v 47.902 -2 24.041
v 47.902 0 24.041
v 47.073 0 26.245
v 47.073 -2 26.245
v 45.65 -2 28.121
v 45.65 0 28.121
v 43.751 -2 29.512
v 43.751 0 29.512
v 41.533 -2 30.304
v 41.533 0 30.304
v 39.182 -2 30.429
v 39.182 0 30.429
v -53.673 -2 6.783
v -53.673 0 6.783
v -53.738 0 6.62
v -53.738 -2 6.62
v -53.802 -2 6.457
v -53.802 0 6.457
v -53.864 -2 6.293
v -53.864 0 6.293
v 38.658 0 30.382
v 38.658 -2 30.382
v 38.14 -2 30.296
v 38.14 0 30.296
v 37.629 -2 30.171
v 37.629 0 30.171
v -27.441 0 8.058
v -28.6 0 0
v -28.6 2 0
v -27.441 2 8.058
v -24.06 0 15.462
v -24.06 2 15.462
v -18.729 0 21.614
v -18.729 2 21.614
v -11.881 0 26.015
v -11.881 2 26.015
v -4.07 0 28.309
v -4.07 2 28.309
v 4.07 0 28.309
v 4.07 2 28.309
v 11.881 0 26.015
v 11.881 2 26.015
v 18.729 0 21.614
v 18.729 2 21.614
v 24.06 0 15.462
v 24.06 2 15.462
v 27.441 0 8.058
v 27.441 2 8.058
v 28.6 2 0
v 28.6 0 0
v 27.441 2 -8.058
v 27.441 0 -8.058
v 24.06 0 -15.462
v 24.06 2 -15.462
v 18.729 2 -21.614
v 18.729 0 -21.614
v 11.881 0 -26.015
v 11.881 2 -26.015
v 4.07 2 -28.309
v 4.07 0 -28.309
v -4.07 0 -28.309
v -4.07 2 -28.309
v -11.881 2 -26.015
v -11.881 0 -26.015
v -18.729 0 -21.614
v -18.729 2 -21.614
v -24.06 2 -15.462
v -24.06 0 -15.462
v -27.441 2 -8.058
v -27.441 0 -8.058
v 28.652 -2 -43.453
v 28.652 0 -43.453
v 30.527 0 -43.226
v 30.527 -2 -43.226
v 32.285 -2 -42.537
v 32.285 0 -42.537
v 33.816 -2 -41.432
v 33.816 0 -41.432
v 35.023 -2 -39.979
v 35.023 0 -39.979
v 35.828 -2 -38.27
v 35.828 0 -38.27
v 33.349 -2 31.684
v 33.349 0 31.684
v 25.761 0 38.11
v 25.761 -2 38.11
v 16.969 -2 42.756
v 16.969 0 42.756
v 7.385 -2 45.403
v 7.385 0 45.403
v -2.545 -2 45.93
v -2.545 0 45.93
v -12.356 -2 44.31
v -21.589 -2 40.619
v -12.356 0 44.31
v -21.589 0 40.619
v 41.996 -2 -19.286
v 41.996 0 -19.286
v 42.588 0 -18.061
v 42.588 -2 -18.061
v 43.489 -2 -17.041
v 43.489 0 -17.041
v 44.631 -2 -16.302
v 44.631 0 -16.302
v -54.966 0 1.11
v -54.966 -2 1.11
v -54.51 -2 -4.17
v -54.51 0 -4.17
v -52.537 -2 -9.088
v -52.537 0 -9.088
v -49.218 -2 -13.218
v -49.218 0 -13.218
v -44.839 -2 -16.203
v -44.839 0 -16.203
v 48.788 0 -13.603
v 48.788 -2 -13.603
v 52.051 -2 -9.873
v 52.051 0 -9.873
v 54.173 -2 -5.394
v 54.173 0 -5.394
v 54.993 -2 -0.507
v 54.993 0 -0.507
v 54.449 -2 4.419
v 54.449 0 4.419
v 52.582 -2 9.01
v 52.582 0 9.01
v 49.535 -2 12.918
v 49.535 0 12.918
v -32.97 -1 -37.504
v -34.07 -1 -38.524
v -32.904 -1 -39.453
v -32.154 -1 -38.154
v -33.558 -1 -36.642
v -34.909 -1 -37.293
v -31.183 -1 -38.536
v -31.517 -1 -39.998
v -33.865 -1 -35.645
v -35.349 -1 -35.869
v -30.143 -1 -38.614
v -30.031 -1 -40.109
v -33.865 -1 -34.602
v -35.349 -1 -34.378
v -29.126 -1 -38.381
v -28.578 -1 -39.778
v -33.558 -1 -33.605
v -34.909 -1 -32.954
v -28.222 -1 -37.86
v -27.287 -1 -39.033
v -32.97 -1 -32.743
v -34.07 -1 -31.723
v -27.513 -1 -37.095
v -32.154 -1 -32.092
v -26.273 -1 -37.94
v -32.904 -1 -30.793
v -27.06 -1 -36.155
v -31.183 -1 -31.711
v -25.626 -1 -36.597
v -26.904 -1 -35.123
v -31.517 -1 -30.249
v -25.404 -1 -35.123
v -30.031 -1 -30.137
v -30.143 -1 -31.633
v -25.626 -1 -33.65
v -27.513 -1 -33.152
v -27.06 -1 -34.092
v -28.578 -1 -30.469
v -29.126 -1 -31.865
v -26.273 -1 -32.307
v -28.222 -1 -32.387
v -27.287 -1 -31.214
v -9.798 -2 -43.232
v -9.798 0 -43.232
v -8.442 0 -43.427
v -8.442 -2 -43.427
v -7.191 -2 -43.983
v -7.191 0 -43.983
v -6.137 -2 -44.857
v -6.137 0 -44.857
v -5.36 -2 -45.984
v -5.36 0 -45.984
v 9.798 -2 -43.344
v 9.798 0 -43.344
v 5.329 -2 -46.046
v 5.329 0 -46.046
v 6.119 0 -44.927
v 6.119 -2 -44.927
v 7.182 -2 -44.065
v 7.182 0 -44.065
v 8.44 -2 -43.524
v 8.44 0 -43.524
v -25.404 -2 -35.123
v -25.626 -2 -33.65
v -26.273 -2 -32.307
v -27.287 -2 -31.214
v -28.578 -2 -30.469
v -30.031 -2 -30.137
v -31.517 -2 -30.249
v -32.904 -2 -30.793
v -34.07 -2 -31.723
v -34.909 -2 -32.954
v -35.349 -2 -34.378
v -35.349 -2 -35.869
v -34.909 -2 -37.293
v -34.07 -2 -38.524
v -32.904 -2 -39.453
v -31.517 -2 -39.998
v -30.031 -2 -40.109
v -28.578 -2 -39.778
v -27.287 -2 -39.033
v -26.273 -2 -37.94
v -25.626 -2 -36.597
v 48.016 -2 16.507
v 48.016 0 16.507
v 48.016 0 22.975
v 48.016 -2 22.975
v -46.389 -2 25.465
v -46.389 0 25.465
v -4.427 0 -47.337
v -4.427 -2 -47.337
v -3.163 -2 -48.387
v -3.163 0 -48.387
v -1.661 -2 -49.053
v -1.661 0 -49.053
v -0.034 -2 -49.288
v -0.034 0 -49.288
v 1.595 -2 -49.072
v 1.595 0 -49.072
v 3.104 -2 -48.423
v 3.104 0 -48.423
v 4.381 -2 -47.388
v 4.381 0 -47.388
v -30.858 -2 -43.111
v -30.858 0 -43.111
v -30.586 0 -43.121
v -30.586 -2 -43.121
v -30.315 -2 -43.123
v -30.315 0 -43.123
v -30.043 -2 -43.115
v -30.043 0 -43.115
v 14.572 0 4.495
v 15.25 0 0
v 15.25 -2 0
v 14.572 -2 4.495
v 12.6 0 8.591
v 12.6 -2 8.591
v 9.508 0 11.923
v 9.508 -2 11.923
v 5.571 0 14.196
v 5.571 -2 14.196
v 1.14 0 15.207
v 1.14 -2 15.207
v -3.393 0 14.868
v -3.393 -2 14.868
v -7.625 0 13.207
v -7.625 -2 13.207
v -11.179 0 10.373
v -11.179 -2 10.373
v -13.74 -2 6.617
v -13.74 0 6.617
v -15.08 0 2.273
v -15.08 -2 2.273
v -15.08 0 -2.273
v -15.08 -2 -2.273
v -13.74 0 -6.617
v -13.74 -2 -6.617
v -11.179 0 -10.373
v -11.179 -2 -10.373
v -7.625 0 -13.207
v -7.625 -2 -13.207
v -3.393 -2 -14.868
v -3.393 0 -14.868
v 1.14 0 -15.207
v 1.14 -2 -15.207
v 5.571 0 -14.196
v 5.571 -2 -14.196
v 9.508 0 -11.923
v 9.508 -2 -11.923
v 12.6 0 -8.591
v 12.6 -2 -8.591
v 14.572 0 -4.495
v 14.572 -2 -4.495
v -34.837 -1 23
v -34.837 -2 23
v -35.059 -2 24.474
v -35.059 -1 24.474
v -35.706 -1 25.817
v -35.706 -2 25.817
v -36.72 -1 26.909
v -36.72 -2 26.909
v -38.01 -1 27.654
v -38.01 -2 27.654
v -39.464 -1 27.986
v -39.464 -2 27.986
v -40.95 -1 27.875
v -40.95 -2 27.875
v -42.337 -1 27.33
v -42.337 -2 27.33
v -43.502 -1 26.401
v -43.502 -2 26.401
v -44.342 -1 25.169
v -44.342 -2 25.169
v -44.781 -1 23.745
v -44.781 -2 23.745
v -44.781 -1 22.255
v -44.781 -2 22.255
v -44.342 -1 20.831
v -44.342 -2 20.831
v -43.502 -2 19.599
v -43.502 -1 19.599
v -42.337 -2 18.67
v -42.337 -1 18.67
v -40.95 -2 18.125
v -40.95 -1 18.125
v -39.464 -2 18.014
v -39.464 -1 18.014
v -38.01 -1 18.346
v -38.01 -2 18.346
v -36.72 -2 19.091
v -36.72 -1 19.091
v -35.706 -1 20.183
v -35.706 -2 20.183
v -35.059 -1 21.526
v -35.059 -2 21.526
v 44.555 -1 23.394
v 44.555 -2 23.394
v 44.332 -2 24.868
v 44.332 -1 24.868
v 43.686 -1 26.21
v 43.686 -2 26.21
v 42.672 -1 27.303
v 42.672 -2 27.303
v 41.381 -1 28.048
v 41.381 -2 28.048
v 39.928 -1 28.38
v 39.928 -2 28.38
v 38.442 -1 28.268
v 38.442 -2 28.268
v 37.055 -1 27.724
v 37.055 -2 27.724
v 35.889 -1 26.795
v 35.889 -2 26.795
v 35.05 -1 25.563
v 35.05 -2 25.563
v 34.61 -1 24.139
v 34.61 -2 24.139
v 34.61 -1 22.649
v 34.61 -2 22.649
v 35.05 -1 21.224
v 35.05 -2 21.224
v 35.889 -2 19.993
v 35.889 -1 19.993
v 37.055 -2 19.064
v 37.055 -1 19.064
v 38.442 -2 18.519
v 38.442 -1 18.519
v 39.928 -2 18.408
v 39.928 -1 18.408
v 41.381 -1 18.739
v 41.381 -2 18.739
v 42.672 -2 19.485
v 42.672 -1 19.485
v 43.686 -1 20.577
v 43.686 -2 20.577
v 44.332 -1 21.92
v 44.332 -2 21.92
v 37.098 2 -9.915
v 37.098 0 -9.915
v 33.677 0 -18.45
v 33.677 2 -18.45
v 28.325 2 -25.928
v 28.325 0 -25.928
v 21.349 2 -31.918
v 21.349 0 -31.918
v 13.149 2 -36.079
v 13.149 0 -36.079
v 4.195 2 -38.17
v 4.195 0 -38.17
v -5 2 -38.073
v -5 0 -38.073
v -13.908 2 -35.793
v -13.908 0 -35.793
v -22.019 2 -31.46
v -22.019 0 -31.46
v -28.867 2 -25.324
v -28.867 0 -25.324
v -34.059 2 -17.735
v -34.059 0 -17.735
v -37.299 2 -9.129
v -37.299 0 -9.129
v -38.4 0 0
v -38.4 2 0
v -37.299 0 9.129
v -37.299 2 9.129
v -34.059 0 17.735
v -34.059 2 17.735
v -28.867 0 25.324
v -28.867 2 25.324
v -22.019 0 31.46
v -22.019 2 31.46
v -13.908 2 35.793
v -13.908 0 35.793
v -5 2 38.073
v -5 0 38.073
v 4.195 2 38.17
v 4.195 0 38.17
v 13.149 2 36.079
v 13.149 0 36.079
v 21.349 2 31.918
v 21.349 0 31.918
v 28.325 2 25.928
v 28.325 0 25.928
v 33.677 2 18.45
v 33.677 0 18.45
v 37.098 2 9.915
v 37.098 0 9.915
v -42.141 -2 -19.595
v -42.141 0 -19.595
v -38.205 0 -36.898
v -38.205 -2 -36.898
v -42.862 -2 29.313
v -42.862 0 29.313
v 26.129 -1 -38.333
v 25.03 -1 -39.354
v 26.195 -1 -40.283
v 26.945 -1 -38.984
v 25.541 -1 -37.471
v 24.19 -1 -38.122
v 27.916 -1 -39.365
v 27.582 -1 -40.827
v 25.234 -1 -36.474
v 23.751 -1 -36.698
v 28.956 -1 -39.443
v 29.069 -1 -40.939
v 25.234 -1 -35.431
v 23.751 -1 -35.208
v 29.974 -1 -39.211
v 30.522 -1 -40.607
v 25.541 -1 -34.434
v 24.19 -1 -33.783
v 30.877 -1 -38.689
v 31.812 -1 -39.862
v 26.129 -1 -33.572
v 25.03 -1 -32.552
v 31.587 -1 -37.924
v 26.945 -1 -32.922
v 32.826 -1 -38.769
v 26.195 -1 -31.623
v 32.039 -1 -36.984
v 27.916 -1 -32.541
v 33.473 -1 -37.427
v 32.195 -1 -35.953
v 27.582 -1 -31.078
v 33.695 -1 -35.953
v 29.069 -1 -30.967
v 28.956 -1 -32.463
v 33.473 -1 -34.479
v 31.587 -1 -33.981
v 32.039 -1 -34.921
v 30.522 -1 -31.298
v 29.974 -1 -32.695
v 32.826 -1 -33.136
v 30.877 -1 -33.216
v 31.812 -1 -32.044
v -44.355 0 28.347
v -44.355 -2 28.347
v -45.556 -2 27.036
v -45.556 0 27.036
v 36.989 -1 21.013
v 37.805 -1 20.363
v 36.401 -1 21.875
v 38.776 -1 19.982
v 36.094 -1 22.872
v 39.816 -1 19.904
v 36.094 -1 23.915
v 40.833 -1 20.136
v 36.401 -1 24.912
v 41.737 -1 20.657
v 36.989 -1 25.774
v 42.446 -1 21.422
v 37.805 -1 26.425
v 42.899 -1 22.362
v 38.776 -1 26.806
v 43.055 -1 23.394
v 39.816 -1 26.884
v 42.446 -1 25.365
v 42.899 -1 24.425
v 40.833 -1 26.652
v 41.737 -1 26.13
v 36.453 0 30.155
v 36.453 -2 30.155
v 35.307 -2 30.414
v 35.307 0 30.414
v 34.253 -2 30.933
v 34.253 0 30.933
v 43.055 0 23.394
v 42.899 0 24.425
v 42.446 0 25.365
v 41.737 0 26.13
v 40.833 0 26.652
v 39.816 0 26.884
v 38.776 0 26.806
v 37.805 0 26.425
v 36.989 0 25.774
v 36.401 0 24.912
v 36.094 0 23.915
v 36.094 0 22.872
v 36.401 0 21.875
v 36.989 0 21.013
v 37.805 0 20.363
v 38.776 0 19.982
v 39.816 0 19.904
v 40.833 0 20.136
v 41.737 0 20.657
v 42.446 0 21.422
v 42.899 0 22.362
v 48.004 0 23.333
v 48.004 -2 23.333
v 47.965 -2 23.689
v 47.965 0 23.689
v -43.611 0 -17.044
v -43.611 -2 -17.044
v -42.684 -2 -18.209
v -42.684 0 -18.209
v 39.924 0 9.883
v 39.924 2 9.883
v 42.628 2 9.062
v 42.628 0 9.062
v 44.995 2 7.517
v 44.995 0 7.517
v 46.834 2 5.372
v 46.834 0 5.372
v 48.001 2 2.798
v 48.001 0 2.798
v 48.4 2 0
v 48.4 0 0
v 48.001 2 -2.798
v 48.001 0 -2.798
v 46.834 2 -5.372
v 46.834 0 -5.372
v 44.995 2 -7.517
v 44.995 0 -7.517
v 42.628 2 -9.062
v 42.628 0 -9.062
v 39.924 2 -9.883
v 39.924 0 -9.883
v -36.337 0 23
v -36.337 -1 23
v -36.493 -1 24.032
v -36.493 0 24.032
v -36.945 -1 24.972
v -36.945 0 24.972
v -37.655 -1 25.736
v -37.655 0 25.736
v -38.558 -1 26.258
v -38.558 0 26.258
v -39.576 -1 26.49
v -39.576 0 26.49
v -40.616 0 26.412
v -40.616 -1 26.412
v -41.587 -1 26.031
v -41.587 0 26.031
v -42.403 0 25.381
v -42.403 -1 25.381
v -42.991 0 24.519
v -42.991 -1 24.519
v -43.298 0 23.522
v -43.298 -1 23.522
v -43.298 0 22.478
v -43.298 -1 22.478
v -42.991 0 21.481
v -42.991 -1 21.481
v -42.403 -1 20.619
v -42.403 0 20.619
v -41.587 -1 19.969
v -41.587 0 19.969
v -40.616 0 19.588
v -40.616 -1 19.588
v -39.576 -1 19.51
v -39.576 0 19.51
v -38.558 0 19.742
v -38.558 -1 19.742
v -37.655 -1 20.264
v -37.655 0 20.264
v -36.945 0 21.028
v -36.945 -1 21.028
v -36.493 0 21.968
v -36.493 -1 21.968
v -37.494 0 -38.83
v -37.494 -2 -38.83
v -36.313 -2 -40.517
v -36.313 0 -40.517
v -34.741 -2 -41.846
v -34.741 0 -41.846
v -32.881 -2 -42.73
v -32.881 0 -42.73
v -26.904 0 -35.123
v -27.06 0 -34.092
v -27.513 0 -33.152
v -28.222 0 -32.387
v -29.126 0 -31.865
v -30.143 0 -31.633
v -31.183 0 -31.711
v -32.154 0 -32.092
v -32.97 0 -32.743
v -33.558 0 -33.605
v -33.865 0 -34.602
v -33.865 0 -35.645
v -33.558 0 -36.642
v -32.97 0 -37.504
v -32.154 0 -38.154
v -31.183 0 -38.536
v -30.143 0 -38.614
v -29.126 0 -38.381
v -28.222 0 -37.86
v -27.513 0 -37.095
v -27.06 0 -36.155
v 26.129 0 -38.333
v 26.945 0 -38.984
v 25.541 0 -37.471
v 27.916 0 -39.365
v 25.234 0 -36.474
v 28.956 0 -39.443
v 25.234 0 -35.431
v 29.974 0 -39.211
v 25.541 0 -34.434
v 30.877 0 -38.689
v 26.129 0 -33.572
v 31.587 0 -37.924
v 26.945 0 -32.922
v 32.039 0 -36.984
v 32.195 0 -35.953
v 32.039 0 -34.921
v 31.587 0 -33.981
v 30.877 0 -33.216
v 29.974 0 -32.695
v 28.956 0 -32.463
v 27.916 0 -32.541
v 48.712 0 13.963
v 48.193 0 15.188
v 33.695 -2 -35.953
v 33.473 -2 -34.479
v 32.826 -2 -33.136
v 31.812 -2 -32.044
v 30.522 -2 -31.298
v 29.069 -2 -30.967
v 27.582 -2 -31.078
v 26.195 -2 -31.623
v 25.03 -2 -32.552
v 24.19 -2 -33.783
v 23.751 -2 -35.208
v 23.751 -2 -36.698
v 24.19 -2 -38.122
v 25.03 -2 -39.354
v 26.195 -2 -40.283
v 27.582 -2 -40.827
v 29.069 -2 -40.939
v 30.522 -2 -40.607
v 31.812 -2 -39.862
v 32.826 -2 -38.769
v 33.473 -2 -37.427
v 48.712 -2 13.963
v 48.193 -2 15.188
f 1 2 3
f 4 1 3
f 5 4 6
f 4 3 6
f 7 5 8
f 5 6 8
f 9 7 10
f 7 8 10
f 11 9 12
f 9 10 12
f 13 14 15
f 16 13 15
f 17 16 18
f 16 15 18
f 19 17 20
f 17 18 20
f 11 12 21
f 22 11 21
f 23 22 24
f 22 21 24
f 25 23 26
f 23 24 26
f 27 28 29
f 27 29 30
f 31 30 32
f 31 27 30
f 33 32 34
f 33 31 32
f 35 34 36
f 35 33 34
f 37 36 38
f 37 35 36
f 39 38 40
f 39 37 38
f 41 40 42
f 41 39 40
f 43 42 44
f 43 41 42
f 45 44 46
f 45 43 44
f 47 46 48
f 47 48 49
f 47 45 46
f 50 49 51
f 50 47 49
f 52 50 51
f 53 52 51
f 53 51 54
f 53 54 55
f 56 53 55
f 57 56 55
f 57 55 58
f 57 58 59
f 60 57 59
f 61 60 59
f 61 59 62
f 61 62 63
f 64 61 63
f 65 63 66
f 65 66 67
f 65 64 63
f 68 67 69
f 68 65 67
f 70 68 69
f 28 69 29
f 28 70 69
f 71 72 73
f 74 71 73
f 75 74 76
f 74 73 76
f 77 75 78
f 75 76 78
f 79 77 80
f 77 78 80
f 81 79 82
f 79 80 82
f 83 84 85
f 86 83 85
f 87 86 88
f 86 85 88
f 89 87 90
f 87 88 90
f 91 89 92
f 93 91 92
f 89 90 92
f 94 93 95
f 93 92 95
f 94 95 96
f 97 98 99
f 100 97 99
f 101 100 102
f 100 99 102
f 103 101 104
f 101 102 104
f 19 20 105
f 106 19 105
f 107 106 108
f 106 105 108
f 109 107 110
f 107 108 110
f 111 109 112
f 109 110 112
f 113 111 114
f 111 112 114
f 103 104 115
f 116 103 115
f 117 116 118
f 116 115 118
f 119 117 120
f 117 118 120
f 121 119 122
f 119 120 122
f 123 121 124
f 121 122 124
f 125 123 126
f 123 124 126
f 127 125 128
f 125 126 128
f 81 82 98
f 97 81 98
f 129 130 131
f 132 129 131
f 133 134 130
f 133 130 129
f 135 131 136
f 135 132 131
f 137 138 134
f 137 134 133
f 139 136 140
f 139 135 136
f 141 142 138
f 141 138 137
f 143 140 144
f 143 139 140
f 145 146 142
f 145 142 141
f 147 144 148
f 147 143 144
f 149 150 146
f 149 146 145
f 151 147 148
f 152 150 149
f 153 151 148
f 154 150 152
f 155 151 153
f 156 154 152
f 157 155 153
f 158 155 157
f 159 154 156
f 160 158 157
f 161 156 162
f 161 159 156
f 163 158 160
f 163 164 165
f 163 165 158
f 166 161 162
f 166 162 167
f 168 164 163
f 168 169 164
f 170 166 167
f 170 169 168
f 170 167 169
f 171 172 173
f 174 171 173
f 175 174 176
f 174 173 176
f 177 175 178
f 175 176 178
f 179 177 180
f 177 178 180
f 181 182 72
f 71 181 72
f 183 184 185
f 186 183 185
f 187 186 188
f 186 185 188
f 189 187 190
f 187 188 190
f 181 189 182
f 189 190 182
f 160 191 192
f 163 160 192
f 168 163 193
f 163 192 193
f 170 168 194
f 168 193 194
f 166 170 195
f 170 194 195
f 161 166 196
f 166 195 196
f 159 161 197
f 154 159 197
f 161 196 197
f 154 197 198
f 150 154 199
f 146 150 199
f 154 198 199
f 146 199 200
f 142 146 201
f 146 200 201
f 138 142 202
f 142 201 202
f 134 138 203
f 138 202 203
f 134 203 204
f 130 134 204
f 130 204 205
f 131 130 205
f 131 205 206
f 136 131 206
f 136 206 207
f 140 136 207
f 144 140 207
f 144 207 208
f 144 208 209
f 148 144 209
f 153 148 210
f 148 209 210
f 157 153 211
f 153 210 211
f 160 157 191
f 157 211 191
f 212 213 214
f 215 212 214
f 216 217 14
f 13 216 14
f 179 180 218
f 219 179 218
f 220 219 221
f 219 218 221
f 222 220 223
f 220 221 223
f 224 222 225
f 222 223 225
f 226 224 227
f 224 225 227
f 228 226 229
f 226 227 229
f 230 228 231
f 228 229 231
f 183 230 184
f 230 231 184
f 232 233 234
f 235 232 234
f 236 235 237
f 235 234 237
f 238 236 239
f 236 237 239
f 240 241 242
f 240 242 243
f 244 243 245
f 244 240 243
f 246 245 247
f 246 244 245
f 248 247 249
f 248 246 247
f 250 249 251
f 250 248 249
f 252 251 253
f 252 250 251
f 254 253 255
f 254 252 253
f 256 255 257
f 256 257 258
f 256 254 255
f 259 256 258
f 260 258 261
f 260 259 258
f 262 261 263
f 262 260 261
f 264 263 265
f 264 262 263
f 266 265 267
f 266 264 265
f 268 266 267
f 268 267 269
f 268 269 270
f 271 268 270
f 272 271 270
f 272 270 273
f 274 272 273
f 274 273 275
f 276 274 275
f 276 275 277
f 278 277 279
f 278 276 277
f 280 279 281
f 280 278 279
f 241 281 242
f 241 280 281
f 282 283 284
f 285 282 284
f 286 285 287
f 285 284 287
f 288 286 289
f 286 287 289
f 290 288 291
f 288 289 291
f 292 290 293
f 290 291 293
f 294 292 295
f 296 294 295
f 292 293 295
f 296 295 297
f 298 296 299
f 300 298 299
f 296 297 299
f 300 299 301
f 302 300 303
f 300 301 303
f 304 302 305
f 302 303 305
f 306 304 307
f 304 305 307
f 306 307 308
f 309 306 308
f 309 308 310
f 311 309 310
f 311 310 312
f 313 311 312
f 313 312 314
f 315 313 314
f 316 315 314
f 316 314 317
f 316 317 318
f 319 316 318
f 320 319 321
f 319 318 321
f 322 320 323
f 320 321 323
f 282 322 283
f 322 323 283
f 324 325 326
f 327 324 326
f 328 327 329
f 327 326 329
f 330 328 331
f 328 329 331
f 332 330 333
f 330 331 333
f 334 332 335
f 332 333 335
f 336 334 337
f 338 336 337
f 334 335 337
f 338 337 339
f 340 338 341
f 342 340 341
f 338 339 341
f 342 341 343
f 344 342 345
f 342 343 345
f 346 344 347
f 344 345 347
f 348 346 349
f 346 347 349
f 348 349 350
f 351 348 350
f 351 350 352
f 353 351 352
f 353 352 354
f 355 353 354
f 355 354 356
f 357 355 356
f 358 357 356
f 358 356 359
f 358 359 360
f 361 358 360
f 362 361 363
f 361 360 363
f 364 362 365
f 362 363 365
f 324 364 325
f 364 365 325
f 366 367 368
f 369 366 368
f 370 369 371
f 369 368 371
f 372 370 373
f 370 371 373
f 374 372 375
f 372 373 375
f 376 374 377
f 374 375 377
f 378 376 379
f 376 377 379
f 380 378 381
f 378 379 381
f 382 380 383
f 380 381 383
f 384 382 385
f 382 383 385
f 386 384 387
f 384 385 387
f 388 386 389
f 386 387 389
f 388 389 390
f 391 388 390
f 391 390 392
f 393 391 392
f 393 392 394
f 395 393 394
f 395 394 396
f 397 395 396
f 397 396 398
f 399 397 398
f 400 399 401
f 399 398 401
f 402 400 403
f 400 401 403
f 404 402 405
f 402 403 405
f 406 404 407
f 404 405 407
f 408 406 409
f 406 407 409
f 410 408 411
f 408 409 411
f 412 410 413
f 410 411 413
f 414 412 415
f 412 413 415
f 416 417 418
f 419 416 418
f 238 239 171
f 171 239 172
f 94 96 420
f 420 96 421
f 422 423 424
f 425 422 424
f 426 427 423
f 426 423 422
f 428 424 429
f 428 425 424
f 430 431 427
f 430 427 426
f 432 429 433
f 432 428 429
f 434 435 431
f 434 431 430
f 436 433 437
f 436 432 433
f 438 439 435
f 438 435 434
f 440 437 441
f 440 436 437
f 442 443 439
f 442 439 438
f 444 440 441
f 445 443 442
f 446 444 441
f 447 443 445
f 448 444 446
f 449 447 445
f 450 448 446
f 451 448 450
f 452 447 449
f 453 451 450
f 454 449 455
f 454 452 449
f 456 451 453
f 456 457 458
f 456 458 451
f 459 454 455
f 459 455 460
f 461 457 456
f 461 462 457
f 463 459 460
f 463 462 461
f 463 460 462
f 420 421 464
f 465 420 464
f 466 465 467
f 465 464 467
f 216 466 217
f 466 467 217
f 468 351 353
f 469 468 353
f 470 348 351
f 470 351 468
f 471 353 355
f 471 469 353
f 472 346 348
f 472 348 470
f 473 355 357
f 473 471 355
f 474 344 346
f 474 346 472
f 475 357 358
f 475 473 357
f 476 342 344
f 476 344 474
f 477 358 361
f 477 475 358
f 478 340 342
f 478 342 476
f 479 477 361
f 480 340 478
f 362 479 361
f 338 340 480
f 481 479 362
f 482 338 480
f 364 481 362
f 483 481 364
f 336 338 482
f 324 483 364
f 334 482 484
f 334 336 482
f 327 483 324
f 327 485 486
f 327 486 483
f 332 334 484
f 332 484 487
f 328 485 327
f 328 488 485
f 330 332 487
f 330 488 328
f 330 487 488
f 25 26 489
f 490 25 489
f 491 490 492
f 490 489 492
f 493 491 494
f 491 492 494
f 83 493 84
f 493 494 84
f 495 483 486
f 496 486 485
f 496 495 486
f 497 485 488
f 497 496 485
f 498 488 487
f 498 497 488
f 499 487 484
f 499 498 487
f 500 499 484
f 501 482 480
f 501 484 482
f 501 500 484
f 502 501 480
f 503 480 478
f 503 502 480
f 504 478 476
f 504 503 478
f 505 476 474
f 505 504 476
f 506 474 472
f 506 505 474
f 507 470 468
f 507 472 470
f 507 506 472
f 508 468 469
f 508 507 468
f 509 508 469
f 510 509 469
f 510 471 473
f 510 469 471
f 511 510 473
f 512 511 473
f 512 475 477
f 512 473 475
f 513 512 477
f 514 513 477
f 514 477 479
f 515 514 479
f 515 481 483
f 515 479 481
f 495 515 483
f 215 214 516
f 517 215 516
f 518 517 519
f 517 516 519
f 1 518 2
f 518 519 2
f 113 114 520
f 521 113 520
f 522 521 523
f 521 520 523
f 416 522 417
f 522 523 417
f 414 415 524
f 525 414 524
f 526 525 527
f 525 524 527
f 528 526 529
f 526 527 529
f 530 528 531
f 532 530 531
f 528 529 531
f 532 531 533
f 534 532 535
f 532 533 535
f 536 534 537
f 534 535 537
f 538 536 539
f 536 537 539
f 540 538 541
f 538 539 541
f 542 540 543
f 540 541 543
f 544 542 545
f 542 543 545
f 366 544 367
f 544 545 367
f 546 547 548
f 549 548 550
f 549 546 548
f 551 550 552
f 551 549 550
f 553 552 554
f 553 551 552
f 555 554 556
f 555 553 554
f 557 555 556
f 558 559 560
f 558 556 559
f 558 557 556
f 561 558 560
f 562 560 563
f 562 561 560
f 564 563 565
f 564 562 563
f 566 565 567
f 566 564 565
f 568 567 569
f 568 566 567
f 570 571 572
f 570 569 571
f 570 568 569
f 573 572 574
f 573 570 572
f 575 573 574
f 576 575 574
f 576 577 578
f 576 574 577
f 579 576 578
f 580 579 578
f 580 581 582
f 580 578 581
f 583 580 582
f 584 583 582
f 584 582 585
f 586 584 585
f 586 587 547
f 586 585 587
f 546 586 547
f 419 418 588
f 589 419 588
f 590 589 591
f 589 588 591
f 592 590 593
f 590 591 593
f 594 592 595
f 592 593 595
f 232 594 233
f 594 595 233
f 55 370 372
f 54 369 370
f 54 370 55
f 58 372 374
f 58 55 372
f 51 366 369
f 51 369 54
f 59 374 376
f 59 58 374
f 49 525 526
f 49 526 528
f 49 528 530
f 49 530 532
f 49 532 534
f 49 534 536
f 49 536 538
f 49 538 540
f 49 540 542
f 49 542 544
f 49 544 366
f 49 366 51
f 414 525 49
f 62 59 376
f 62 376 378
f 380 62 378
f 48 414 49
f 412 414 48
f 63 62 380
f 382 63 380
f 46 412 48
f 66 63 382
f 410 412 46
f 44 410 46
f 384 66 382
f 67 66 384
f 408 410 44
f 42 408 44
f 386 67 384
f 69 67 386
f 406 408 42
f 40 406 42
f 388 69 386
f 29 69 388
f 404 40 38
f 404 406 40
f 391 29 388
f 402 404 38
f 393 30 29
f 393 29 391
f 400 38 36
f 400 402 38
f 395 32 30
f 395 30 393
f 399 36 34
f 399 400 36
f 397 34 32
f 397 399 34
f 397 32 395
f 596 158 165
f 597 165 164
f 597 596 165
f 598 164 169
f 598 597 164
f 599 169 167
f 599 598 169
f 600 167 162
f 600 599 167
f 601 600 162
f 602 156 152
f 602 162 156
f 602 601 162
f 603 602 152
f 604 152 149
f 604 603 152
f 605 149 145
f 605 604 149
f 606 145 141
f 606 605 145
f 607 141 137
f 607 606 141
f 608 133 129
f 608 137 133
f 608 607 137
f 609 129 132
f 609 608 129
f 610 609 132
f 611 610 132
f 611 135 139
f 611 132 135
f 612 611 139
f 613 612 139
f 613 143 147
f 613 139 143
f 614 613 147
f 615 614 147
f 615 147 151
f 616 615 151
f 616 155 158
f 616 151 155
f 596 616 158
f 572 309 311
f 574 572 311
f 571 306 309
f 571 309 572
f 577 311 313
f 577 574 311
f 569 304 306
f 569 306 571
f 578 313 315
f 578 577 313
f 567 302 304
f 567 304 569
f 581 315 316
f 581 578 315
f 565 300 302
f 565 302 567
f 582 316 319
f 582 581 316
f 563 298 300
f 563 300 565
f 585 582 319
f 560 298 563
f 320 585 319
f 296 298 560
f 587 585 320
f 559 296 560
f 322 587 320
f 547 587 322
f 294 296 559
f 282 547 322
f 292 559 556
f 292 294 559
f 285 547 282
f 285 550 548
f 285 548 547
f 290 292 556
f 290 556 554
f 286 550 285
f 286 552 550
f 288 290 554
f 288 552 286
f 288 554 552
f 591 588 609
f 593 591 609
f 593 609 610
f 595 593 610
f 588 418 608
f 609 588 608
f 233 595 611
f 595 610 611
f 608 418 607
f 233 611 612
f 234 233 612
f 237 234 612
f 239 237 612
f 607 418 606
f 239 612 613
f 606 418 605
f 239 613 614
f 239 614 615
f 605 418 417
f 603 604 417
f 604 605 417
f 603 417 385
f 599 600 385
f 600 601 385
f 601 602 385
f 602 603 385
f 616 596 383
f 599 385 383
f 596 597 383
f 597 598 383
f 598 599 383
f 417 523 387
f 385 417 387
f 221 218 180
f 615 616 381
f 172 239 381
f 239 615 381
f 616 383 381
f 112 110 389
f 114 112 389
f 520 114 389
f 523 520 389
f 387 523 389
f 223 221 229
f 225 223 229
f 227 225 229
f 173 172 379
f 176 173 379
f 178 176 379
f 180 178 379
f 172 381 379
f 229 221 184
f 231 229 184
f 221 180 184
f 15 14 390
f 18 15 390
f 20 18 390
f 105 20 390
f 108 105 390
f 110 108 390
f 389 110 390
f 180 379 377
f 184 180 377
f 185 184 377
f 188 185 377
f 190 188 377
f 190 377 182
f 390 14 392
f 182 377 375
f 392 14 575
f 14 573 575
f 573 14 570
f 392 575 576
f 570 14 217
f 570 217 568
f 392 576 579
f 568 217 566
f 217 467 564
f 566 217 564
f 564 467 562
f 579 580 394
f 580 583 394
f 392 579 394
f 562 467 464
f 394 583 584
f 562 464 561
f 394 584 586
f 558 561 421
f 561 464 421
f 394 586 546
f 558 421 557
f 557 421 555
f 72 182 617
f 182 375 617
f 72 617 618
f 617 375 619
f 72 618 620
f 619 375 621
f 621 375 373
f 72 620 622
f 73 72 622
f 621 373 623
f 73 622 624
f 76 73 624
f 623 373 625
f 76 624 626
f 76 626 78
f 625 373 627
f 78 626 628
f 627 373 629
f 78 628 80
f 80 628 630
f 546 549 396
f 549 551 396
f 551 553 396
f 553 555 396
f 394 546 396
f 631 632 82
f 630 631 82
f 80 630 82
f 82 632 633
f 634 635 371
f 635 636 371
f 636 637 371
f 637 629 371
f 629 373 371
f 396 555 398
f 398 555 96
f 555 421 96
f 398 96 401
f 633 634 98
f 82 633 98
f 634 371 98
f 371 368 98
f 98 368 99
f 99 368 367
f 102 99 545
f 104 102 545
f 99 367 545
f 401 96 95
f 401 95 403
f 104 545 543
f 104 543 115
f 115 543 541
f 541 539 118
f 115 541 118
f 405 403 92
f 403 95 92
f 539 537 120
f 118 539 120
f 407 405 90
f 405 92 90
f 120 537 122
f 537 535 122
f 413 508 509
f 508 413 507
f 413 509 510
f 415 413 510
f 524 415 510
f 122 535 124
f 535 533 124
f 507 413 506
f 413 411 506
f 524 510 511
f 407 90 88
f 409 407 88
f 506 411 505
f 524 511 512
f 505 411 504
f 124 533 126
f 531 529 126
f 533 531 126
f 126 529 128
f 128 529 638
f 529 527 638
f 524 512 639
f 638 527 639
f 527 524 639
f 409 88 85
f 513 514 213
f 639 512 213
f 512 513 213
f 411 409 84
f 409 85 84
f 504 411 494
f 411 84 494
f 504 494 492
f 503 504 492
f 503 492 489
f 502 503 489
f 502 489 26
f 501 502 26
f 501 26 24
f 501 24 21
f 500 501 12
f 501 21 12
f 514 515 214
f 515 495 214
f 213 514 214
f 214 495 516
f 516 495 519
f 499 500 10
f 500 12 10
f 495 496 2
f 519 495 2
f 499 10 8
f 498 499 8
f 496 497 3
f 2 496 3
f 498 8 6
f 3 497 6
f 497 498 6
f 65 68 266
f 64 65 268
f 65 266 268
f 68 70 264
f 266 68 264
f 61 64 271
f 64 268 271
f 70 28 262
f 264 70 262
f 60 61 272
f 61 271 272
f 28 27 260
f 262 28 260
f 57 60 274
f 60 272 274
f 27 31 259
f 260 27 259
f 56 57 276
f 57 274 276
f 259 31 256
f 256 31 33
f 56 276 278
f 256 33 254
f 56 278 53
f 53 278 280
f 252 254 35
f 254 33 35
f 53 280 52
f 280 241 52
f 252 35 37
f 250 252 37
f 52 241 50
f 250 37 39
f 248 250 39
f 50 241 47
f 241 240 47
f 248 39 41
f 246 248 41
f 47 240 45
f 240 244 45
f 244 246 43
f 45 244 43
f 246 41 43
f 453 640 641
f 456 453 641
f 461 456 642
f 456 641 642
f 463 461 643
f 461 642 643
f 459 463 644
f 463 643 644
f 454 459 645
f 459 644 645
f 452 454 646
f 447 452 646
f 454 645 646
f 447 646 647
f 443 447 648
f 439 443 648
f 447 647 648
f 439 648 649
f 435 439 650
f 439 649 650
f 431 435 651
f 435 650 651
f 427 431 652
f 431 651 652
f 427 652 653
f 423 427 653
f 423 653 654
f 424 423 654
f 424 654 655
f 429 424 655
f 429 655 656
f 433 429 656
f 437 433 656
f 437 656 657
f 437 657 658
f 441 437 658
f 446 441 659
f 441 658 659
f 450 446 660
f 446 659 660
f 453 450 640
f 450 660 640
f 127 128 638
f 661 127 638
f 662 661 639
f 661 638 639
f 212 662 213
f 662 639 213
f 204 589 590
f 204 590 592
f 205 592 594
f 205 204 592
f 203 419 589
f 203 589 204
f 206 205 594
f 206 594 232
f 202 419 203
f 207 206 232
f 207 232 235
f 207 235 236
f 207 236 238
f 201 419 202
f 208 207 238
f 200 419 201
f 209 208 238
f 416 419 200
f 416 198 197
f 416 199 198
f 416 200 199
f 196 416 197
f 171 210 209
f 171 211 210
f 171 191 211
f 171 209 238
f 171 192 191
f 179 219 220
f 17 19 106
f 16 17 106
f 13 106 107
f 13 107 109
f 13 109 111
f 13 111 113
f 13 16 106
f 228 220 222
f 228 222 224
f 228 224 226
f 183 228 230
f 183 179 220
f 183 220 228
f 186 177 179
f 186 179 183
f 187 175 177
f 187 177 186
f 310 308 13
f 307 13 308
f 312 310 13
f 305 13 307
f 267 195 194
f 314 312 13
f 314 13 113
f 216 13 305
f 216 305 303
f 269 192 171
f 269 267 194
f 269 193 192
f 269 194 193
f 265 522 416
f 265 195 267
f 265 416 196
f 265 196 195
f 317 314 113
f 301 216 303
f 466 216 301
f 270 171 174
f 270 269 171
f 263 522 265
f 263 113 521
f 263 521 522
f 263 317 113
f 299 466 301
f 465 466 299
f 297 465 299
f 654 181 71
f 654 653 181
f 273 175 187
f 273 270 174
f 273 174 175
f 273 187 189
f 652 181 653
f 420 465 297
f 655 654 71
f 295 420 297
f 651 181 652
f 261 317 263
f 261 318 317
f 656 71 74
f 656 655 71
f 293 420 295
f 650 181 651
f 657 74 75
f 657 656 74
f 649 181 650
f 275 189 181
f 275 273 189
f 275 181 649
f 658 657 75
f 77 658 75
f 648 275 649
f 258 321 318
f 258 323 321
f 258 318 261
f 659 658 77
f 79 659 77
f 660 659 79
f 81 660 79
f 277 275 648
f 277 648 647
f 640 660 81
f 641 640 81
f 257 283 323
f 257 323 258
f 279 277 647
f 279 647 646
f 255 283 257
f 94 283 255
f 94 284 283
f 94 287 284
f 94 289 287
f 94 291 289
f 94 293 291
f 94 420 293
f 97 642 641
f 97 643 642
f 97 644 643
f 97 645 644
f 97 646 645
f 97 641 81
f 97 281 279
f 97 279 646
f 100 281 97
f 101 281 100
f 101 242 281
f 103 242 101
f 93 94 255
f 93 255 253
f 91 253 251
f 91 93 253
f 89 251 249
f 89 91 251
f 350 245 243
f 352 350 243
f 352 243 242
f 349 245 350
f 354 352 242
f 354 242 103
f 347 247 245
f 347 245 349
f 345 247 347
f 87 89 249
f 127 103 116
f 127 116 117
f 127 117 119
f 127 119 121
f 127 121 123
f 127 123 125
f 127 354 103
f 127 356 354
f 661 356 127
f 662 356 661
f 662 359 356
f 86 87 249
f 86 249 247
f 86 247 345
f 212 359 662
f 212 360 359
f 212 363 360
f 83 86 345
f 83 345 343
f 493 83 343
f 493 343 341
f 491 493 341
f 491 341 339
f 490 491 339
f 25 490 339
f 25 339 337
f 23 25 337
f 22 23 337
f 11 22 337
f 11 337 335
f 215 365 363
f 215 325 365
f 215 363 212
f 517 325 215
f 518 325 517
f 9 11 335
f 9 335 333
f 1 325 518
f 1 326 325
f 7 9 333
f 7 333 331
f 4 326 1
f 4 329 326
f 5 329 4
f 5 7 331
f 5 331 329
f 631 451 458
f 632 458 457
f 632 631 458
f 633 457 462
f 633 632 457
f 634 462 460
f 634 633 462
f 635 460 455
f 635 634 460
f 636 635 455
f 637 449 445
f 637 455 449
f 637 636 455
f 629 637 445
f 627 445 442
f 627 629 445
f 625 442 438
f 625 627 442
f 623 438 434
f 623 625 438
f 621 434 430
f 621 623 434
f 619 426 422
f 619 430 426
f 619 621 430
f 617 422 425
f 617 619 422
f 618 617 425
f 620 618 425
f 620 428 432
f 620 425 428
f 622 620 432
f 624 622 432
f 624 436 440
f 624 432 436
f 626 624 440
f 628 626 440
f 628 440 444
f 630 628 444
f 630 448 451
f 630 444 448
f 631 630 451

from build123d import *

# Parameters (mm, degrees)
F0_R     = 3.5
F0_R_2   = 15.25
F1_DEPTH = 2
F2_R     = 28.6
F3_DEPTH = 2
F4_R     = 5
F5_DEPTH = 1


with BuildPart() as f1:
    # F0 (on Front) → F1 (new body)
    with BuildSketch(Plane.XZ):
        with BuildLine():
            Line((-21.58884, 40.619232), (-42.861558, 29.312929))
            ThreePointArc((-42.861558, 29.312929), (-44.997448, 27.729855), (-46.388978, 25.46451))
            Line((-46.388978, 25.46451), (-53.672966, 6.783229))
            Line((-53.672966, 6.783229), (-53.864057, 6.293138))
            ThreePointArc((-53.864057, 6.293138), (-53.705851, -6.701832), (-44.839242, -16.20328))
            ThreePointArc((-44.839242, -16.20328), (-43.103725, -17.591673), (-42.141379, -19.595055))
            Line((-42.141379, -19.595055), (-38.205048, -36.897988))
            ThreePointArc((-38.205048, -36.897988), (-35.569679, -41.232337), (-30.857548, -43.110523))
            Line((-30.857548, -43.110523), (-30.043042, -43.115206))
            Line((-30.043042, -43.115206), (-9.797797, -43.231604))
            ThreePointArc((-9.797797, -43.231604), (-7.190907, -43.98259), (-5.359933, -45.984437))
            ThreePointArc((-5.359933, -45.984437), (-0.034496, -49.287837), (5.328573, -46.04589))
            ThreePointArc((5.328573, -46.04589), (7.182444, -44.065228), (9.797797, -43.344267))
            Line((9.797797, -43.344267), (28.65177, -43.452666))
            ThreePointArc((28.65177, -43.452666), (33.085897, -42.033009), (35.827873, -38.270234))
            Line((35.827873, -38.270234), (41.995789, -19.285684))
            ThreePointArc((41.995789, -19.285684), (43.003835, -17.520371), (44.631304, -16.302245))
            ThreePointArc((44.631304, -16.302245), (54.75181, -2.9788), (49.534597, 12.918354))
            ThreePointArc((49.534597, 12.918354), (48.411586, 14.558602), (48.01643, 16.506786))
            Line((48.01643, 16.506786), (48.01643, 22.9754))
            ThreePointArc((48.01643, 22.9754), (47.987621, 23.511359), (47.901529, 24.041142))
            ThreePointArc((47.901529, 24.041142), (44.750848, 28.885488), (39.182116, 30.429409))
            ThreePointArc((39.182116, 30.429409), (38.635854, 30.360699), (38.095468, 30.255318))
            ThreePointArc((38.095468, 30.255318), (37.863026, 30.207571), (37.628581, 30.170906))
            ThreePointArc((37.628581, 30.170906), (35.306998, 30.413689), (33.348619, 31.683901))
            ThreePointArc((33.348619, 31.683901), (7.384655, 45.403379), (-21.58884, 40.619232))
        make_face()
        with Locations((-30.40436, -35.12337)):
            Circle(F0_R, mode=Mode.SUBTRACT)
        with Locations((28.69489, -35.95279)):
            Circle(F0_R, mode=Mode.SUBTRACT)
        with Locations((-39.83717, 23)):
            Circle(F0_R, mode=Mode.SUBTRACT)
        Circle(F0_R_2, mode=Mode.SUBTRACT)
        with Locations((39.55455, 23.39376)):
            Circle(F0_R, mode=Mode.SUBTRACT)
        with BuildLine():
            Line((-53.864057, 6.293138), (-53.672966, 6.783229))
            ThreePointArc((-53.672966, 6.783229), (-53.770302, 6.538881), (-53.864057, 6.293138))
        make_face()
        with BuildLine():
            ThreePointArc((39.182116, 30.429409), (38.398103, 30.343702), (37.628581, 30.170906))
            ThreePointArc((37.628581, 30.170906), (37.863026, 30.207571), (38.095468, 30.255318))
            ThreePointArc((38.095468, 30.255318), (38.635854, 30.360699), (39.182116, 30.429409))
        make_face()
        with BuildLine():
            Line((-30.043042, -43.115206), (-30.857548, -43.110523))
            ThreePointArc((-30.857548, -43.110523), (-30.450354, -43.123238), (-30.043042, -43.115206))
        make_face()
    extrude(amount=F1_DEPTH)

    # F2 (on face) → F3 (join)
    with BuildSketch(Plane(origin=(0, 0, 0), x_dir=(-1, 0, 0), z_dir=(0, 1, 0))):
        with BuildLine():
            ThreePointArc((-37.097917, 9.914867), (-48.4, 0), (-37.097917, -9.914867))
            ThreePointArc((-37.097917, -9.914867), (38.4, 0), (-37.097917, 9.914867))
        make_face()
        Circle(F2_R, mode=Mode.SUBTRACT)
    extrude(amount=F3_DEPTH)

    # F4 (on face) → F5 (cut)
    with BuildSketch(Plane.XZ.offset(2)):
        with Locations((-39.83717, 23)):
            Circle(F4_R)
        with Locations((39.55455, 23.39376)):
            Circle(F4_R)
        with Locations((28.69489, -35.95279)):
            Circle(F4_R)
        with Locations((-30.40436, -35.12337)):
            Circle(F4_R)
    extrude(amount=-F5_DEPTH, mode=Mode.SUBTRACT)


solid = f1.part
